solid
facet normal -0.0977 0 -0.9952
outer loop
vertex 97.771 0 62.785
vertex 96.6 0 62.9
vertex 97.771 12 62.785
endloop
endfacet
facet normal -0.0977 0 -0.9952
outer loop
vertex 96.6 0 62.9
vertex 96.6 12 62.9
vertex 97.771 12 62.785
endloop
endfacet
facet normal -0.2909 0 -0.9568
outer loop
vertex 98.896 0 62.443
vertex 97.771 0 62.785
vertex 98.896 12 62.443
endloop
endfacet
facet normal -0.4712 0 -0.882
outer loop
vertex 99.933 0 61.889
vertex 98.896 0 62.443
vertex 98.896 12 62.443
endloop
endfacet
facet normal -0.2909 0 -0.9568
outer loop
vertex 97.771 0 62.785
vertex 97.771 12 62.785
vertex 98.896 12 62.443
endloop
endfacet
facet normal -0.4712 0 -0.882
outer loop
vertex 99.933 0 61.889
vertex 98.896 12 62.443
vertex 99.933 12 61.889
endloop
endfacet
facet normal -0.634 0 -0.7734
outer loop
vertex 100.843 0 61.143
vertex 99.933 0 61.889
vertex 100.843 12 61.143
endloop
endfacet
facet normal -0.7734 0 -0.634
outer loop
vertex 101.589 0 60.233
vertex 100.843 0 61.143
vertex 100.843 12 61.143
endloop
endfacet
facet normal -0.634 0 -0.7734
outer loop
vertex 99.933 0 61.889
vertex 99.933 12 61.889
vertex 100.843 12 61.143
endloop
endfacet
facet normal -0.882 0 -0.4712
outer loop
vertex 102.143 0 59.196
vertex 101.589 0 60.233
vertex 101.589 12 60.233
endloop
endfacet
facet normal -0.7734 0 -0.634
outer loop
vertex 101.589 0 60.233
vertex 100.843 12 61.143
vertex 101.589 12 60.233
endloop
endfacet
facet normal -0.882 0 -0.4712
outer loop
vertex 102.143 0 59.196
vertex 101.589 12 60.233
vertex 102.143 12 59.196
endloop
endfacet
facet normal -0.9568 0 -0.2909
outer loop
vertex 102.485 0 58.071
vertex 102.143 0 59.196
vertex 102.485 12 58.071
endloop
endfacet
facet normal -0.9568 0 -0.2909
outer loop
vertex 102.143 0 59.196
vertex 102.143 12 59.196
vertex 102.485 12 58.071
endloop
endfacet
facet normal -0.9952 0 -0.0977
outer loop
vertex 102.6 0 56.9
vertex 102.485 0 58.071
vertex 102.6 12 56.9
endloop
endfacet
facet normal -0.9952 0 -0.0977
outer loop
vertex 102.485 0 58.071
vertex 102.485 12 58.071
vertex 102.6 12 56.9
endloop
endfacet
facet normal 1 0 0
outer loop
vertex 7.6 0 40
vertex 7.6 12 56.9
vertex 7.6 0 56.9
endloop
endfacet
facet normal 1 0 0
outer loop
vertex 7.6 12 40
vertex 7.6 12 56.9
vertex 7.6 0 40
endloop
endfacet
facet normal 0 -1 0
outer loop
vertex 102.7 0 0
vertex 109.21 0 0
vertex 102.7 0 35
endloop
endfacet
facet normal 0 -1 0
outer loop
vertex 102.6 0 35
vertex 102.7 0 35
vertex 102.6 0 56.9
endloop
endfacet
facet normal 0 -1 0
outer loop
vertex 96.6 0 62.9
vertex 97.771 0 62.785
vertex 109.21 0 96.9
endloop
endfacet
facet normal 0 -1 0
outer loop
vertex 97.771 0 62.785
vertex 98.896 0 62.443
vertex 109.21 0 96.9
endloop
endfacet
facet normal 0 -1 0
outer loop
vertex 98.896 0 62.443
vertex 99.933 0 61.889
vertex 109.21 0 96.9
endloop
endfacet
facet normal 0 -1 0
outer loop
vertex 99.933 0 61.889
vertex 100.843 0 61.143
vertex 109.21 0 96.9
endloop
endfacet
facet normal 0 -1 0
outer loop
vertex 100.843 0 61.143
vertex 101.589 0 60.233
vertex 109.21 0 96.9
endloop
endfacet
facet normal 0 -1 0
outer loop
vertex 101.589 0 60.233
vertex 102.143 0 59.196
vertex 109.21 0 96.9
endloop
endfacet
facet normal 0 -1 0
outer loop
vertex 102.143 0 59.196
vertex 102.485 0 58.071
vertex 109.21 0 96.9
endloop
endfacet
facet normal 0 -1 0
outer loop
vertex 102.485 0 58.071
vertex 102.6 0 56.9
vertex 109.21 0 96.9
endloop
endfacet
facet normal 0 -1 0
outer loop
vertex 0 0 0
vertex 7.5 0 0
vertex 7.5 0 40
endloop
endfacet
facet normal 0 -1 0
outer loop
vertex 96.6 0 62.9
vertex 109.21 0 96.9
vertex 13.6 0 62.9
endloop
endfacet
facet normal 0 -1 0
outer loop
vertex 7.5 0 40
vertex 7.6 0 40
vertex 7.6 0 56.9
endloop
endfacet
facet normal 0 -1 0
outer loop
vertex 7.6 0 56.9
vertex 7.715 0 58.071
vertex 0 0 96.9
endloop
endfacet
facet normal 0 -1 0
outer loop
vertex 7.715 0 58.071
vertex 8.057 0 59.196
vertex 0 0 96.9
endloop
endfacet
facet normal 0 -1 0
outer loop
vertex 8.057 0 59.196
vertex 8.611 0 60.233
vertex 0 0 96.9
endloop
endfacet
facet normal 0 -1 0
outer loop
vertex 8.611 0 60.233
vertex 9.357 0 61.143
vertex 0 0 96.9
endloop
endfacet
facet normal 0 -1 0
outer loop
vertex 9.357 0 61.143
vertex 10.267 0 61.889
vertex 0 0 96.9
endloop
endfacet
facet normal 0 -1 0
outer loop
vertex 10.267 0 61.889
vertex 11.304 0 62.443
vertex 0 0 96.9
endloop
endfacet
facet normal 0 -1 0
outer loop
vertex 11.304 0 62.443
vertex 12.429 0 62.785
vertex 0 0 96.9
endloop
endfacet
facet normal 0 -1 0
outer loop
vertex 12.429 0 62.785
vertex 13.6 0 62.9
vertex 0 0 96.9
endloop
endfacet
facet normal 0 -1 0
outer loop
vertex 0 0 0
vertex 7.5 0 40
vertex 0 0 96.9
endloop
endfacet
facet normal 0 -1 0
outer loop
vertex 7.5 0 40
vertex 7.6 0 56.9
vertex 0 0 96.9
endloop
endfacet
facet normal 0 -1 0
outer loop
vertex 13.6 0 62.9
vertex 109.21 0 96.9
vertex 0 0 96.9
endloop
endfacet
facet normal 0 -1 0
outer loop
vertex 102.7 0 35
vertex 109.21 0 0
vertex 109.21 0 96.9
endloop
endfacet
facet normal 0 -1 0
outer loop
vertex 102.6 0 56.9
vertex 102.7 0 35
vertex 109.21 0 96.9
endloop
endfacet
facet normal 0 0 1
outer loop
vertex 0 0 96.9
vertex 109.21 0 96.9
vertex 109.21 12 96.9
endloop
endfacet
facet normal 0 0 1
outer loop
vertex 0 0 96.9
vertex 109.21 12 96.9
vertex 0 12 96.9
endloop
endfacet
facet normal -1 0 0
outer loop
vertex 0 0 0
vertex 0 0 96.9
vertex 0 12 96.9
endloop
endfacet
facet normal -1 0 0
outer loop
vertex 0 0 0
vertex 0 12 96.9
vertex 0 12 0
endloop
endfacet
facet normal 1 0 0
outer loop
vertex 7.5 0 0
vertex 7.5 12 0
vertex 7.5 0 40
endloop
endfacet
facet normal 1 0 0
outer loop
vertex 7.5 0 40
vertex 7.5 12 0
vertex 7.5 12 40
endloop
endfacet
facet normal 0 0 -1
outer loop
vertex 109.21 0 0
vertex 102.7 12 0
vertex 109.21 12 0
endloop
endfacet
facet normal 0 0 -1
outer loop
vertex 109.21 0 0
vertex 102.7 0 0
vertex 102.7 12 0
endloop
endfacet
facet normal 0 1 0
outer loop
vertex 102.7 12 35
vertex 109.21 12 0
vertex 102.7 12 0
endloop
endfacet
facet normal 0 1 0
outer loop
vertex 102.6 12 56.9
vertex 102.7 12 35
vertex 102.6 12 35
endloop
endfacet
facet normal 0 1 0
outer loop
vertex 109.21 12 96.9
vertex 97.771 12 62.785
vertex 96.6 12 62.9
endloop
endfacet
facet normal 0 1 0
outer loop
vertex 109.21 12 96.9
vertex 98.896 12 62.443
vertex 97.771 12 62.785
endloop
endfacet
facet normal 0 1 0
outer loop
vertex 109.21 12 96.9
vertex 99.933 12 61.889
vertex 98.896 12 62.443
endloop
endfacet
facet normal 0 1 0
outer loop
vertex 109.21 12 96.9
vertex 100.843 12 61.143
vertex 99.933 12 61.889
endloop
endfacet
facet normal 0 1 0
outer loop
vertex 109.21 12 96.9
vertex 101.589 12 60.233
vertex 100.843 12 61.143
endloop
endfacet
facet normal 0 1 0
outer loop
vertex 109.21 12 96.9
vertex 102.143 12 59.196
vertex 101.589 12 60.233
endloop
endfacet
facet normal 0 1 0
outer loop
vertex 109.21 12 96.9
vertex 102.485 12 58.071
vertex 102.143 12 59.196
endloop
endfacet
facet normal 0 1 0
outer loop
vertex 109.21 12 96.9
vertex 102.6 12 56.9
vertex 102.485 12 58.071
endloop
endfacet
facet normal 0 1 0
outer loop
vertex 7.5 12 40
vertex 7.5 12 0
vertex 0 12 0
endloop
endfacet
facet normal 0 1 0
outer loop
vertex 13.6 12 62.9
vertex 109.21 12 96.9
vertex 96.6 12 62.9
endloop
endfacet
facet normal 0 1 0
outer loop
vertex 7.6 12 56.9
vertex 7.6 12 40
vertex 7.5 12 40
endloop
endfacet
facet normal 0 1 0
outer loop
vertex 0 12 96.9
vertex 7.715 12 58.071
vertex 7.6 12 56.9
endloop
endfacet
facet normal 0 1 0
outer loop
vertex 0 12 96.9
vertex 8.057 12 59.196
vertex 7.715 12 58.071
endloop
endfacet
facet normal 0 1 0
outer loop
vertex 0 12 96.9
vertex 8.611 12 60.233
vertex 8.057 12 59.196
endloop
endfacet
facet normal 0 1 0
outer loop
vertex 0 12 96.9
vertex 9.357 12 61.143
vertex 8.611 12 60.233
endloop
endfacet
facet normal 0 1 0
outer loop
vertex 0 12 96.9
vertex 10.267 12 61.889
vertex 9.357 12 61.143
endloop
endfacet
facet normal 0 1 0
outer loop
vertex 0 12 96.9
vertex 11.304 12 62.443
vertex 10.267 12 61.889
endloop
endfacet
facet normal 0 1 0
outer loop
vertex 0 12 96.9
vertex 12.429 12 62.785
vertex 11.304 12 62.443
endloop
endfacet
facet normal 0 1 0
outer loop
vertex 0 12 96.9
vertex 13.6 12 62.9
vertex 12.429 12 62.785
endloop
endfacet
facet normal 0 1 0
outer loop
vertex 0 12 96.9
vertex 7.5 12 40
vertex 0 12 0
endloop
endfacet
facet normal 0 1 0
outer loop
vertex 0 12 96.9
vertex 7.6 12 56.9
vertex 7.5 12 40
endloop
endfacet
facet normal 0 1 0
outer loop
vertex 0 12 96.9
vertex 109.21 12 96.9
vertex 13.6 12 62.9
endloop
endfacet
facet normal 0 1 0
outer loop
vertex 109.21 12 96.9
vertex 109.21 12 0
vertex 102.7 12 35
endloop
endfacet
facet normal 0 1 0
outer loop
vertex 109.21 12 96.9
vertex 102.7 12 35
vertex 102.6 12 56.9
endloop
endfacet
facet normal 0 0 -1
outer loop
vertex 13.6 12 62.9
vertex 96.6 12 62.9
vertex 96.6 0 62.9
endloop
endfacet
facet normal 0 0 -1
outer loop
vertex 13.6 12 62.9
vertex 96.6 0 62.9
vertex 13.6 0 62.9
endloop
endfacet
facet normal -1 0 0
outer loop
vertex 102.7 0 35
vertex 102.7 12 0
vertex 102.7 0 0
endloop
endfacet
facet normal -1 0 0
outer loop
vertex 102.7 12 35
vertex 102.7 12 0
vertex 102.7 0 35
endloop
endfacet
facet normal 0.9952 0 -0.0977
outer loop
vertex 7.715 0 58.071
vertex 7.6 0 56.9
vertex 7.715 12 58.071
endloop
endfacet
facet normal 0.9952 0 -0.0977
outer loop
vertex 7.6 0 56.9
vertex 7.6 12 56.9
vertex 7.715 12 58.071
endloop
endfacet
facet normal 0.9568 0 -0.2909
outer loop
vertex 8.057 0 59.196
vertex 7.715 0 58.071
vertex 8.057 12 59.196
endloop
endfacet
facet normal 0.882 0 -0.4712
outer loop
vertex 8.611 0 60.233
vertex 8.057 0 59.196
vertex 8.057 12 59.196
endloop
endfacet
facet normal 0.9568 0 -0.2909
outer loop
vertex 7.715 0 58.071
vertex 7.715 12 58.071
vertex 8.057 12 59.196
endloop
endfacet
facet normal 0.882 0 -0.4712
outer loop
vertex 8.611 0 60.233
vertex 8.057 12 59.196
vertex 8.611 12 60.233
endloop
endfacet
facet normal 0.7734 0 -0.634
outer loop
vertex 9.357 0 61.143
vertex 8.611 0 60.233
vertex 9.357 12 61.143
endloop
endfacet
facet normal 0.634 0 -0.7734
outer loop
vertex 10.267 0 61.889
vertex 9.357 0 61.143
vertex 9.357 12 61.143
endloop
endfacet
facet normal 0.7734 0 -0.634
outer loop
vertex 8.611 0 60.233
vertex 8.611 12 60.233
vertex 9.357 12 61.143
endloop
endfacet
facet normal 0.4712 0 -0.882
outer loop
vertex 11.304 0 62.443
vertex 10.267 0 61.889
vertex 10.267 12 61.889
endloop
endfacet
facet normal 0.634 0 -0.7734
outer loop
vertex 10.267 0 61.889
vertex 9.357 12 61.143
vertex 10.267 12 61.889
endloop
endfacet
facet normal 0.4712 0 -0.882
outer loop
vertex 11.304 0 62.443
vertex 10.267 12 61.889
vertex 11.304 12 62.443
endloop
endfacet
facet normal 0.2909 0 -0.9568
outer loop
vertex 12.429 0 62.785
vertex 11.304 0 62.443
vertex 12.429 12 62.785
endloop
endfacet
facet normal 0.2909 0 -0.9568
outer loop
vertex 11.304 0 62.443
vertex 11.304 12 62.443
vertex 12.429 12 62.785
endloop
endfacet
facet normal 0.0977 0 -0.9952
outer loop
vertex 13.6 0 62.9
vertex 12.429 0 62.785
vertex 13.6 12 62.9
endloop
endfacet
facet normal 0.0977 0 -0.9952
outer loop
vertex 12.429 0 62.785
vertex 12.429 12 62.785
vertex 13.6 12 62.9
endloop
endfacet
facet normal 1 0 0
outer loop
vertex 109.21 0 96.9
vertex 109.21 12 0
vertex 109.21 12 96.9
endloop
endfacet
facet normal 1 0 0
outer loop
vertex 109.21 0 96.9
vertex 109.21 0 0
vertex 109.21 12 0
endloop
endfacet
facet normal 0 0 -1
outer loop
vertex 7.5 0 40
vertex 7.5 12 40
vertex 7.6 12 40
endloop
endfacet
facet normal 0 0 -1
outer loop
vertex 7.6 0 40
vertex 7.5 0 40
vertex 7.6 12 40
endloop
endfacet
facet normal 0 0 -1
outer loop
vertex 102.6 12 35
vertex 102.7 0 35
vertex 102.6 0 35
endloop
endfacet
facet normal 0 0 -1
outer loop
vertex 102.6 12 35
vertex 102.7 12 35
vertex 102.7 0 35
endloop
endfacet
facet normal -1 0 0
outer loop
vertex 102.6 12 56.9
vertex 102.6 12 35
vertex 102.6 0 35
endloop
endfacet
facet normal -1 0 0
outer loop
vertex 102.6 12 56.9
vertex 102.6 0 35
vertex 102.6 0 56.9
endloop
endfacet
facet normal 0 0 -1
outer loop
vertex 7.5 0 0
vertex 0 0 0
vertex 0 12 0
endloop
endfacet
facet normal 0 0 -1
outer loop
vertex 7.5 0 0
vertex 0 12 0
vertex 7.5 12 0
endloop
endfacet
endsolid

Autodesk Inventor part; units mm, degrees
ref_plane "YZ Plane" through (0, 0, 0) normal (1, 0, 0) x (0, 1, 0)
ref_plane "XZ Plane" through (0, 0, 0) normal (0, 1, 0) x (-1, 0, 0)
ref_plane "XY Plane" through (0, 0, 0) normal (0, 0, 1) x (1, 0, 0)
sketch "Skizze1" plane through (0, 0, 0) normal (0, 1, 0) x (-1, 0, 0)
  line L0 (0, 0) -> (-109.21, 0)
  line L1 (-109.21, 0) -> (-109.21, 96.9)
  line L2 (-109.21, 96.9) -> (0, 96.9)
  line L3 (0, 96.9) -> (0, 0)
  dimension "d5" = 109.21
  dimension "d6" = 96.9
extrude "Extrusion1" add sketch "Skizze1" along normal blind 12
sketch "Skizze2" plane through (0, 12, 0) normal (0, 1, 0) x (1, 0, 0)
  line L0 (7.6, 0) -> (102.6, 0)
  line L1 (102.6, 0) -> (102.6, -56.9)
  line L2 (96.6, -62.9) -> (13.6, -62.9)
  line L3 (7.6, -56.9) -> (7.6, 0)
  arc A0 (7.6, -56.9) -> (13.6, -62.9) centre (13.6, -56.9) ccw
  arc A1 (96.6, -62.9) -> (102.6, -56.9) centre (96.6, -56.9) ccw
  line L4 (0, 0) -> (0, -96.9) projected
  line L5 (109.21, 0) -> (0, 0) projected
  dimension "d2" = 6
  dimension "d7" = 7.6
  dimension "d8" = 62.9
  dimension "d9" = 95
extrude "Extrusion2" cut sketch "Skizze2" against normal through all
sketch "Skizze3" plane through (0, 12, 0) normal (0, 1, 0) x (1, 0, 0)
  line L0 (7.6, -56.9) -> (7.6, 0) projected
  line L1 (7.6, 0) -> (0, 0) projected
  line L2 (0, 0) -> (0, -96.9) projected
  line L3 (0, -96.9) -> (109.21, -96.9) projected
  line L4 (109.21, -96.9) -> (109.21, 0) projected
  line L5 (109.21, 0) -> (102.6, 0) projected
  line L6 (102.6, 0) -> (102.6, -56.9) projected
  arc A0 (96.6, -62.9) -> (102.6, -56.9) centre (96.6, -56.9) ccw projected
  line L7 (96.6, -62.9) -> (13.6, -62.9) projected
  arc A1 (7.6, -56.9) -> (13.6, -62.9) centre (13.6, -56.9) ccw projected
  line L8 (102.6, 0) -> (102.7, 0)
  line L9 (102.7, 0) -> (102.7, -35)
  line L10 (102.7, -35) -> (102.6, -35)
  line L11 (102.6, -35) -> (102.6, 0)
  line L12 (7.6, 0) -> (7.6, -56.9) projected
  line L13 (7.6, 0) -> (7.5, 0)
  line L14 (7.5, 0) -> (7.5, -40)
  line L15 (7.5, -40) -> (7.6, -40)
  line L16 (7.6, -40) -> (7.6, 0)
  point P0 (102.6, -35)
  dimension "d10" = 0.1
  dimension "d11" = 35
  dimension "d12" = 0.1
extrude "Extrusion3" cut sketch "Skizze3" against normal through all contours L15 L14 L1 L0 | L6 L5 L9 L10
properties part number "30_XYTable_Aliexpress_CAM_cutout"
